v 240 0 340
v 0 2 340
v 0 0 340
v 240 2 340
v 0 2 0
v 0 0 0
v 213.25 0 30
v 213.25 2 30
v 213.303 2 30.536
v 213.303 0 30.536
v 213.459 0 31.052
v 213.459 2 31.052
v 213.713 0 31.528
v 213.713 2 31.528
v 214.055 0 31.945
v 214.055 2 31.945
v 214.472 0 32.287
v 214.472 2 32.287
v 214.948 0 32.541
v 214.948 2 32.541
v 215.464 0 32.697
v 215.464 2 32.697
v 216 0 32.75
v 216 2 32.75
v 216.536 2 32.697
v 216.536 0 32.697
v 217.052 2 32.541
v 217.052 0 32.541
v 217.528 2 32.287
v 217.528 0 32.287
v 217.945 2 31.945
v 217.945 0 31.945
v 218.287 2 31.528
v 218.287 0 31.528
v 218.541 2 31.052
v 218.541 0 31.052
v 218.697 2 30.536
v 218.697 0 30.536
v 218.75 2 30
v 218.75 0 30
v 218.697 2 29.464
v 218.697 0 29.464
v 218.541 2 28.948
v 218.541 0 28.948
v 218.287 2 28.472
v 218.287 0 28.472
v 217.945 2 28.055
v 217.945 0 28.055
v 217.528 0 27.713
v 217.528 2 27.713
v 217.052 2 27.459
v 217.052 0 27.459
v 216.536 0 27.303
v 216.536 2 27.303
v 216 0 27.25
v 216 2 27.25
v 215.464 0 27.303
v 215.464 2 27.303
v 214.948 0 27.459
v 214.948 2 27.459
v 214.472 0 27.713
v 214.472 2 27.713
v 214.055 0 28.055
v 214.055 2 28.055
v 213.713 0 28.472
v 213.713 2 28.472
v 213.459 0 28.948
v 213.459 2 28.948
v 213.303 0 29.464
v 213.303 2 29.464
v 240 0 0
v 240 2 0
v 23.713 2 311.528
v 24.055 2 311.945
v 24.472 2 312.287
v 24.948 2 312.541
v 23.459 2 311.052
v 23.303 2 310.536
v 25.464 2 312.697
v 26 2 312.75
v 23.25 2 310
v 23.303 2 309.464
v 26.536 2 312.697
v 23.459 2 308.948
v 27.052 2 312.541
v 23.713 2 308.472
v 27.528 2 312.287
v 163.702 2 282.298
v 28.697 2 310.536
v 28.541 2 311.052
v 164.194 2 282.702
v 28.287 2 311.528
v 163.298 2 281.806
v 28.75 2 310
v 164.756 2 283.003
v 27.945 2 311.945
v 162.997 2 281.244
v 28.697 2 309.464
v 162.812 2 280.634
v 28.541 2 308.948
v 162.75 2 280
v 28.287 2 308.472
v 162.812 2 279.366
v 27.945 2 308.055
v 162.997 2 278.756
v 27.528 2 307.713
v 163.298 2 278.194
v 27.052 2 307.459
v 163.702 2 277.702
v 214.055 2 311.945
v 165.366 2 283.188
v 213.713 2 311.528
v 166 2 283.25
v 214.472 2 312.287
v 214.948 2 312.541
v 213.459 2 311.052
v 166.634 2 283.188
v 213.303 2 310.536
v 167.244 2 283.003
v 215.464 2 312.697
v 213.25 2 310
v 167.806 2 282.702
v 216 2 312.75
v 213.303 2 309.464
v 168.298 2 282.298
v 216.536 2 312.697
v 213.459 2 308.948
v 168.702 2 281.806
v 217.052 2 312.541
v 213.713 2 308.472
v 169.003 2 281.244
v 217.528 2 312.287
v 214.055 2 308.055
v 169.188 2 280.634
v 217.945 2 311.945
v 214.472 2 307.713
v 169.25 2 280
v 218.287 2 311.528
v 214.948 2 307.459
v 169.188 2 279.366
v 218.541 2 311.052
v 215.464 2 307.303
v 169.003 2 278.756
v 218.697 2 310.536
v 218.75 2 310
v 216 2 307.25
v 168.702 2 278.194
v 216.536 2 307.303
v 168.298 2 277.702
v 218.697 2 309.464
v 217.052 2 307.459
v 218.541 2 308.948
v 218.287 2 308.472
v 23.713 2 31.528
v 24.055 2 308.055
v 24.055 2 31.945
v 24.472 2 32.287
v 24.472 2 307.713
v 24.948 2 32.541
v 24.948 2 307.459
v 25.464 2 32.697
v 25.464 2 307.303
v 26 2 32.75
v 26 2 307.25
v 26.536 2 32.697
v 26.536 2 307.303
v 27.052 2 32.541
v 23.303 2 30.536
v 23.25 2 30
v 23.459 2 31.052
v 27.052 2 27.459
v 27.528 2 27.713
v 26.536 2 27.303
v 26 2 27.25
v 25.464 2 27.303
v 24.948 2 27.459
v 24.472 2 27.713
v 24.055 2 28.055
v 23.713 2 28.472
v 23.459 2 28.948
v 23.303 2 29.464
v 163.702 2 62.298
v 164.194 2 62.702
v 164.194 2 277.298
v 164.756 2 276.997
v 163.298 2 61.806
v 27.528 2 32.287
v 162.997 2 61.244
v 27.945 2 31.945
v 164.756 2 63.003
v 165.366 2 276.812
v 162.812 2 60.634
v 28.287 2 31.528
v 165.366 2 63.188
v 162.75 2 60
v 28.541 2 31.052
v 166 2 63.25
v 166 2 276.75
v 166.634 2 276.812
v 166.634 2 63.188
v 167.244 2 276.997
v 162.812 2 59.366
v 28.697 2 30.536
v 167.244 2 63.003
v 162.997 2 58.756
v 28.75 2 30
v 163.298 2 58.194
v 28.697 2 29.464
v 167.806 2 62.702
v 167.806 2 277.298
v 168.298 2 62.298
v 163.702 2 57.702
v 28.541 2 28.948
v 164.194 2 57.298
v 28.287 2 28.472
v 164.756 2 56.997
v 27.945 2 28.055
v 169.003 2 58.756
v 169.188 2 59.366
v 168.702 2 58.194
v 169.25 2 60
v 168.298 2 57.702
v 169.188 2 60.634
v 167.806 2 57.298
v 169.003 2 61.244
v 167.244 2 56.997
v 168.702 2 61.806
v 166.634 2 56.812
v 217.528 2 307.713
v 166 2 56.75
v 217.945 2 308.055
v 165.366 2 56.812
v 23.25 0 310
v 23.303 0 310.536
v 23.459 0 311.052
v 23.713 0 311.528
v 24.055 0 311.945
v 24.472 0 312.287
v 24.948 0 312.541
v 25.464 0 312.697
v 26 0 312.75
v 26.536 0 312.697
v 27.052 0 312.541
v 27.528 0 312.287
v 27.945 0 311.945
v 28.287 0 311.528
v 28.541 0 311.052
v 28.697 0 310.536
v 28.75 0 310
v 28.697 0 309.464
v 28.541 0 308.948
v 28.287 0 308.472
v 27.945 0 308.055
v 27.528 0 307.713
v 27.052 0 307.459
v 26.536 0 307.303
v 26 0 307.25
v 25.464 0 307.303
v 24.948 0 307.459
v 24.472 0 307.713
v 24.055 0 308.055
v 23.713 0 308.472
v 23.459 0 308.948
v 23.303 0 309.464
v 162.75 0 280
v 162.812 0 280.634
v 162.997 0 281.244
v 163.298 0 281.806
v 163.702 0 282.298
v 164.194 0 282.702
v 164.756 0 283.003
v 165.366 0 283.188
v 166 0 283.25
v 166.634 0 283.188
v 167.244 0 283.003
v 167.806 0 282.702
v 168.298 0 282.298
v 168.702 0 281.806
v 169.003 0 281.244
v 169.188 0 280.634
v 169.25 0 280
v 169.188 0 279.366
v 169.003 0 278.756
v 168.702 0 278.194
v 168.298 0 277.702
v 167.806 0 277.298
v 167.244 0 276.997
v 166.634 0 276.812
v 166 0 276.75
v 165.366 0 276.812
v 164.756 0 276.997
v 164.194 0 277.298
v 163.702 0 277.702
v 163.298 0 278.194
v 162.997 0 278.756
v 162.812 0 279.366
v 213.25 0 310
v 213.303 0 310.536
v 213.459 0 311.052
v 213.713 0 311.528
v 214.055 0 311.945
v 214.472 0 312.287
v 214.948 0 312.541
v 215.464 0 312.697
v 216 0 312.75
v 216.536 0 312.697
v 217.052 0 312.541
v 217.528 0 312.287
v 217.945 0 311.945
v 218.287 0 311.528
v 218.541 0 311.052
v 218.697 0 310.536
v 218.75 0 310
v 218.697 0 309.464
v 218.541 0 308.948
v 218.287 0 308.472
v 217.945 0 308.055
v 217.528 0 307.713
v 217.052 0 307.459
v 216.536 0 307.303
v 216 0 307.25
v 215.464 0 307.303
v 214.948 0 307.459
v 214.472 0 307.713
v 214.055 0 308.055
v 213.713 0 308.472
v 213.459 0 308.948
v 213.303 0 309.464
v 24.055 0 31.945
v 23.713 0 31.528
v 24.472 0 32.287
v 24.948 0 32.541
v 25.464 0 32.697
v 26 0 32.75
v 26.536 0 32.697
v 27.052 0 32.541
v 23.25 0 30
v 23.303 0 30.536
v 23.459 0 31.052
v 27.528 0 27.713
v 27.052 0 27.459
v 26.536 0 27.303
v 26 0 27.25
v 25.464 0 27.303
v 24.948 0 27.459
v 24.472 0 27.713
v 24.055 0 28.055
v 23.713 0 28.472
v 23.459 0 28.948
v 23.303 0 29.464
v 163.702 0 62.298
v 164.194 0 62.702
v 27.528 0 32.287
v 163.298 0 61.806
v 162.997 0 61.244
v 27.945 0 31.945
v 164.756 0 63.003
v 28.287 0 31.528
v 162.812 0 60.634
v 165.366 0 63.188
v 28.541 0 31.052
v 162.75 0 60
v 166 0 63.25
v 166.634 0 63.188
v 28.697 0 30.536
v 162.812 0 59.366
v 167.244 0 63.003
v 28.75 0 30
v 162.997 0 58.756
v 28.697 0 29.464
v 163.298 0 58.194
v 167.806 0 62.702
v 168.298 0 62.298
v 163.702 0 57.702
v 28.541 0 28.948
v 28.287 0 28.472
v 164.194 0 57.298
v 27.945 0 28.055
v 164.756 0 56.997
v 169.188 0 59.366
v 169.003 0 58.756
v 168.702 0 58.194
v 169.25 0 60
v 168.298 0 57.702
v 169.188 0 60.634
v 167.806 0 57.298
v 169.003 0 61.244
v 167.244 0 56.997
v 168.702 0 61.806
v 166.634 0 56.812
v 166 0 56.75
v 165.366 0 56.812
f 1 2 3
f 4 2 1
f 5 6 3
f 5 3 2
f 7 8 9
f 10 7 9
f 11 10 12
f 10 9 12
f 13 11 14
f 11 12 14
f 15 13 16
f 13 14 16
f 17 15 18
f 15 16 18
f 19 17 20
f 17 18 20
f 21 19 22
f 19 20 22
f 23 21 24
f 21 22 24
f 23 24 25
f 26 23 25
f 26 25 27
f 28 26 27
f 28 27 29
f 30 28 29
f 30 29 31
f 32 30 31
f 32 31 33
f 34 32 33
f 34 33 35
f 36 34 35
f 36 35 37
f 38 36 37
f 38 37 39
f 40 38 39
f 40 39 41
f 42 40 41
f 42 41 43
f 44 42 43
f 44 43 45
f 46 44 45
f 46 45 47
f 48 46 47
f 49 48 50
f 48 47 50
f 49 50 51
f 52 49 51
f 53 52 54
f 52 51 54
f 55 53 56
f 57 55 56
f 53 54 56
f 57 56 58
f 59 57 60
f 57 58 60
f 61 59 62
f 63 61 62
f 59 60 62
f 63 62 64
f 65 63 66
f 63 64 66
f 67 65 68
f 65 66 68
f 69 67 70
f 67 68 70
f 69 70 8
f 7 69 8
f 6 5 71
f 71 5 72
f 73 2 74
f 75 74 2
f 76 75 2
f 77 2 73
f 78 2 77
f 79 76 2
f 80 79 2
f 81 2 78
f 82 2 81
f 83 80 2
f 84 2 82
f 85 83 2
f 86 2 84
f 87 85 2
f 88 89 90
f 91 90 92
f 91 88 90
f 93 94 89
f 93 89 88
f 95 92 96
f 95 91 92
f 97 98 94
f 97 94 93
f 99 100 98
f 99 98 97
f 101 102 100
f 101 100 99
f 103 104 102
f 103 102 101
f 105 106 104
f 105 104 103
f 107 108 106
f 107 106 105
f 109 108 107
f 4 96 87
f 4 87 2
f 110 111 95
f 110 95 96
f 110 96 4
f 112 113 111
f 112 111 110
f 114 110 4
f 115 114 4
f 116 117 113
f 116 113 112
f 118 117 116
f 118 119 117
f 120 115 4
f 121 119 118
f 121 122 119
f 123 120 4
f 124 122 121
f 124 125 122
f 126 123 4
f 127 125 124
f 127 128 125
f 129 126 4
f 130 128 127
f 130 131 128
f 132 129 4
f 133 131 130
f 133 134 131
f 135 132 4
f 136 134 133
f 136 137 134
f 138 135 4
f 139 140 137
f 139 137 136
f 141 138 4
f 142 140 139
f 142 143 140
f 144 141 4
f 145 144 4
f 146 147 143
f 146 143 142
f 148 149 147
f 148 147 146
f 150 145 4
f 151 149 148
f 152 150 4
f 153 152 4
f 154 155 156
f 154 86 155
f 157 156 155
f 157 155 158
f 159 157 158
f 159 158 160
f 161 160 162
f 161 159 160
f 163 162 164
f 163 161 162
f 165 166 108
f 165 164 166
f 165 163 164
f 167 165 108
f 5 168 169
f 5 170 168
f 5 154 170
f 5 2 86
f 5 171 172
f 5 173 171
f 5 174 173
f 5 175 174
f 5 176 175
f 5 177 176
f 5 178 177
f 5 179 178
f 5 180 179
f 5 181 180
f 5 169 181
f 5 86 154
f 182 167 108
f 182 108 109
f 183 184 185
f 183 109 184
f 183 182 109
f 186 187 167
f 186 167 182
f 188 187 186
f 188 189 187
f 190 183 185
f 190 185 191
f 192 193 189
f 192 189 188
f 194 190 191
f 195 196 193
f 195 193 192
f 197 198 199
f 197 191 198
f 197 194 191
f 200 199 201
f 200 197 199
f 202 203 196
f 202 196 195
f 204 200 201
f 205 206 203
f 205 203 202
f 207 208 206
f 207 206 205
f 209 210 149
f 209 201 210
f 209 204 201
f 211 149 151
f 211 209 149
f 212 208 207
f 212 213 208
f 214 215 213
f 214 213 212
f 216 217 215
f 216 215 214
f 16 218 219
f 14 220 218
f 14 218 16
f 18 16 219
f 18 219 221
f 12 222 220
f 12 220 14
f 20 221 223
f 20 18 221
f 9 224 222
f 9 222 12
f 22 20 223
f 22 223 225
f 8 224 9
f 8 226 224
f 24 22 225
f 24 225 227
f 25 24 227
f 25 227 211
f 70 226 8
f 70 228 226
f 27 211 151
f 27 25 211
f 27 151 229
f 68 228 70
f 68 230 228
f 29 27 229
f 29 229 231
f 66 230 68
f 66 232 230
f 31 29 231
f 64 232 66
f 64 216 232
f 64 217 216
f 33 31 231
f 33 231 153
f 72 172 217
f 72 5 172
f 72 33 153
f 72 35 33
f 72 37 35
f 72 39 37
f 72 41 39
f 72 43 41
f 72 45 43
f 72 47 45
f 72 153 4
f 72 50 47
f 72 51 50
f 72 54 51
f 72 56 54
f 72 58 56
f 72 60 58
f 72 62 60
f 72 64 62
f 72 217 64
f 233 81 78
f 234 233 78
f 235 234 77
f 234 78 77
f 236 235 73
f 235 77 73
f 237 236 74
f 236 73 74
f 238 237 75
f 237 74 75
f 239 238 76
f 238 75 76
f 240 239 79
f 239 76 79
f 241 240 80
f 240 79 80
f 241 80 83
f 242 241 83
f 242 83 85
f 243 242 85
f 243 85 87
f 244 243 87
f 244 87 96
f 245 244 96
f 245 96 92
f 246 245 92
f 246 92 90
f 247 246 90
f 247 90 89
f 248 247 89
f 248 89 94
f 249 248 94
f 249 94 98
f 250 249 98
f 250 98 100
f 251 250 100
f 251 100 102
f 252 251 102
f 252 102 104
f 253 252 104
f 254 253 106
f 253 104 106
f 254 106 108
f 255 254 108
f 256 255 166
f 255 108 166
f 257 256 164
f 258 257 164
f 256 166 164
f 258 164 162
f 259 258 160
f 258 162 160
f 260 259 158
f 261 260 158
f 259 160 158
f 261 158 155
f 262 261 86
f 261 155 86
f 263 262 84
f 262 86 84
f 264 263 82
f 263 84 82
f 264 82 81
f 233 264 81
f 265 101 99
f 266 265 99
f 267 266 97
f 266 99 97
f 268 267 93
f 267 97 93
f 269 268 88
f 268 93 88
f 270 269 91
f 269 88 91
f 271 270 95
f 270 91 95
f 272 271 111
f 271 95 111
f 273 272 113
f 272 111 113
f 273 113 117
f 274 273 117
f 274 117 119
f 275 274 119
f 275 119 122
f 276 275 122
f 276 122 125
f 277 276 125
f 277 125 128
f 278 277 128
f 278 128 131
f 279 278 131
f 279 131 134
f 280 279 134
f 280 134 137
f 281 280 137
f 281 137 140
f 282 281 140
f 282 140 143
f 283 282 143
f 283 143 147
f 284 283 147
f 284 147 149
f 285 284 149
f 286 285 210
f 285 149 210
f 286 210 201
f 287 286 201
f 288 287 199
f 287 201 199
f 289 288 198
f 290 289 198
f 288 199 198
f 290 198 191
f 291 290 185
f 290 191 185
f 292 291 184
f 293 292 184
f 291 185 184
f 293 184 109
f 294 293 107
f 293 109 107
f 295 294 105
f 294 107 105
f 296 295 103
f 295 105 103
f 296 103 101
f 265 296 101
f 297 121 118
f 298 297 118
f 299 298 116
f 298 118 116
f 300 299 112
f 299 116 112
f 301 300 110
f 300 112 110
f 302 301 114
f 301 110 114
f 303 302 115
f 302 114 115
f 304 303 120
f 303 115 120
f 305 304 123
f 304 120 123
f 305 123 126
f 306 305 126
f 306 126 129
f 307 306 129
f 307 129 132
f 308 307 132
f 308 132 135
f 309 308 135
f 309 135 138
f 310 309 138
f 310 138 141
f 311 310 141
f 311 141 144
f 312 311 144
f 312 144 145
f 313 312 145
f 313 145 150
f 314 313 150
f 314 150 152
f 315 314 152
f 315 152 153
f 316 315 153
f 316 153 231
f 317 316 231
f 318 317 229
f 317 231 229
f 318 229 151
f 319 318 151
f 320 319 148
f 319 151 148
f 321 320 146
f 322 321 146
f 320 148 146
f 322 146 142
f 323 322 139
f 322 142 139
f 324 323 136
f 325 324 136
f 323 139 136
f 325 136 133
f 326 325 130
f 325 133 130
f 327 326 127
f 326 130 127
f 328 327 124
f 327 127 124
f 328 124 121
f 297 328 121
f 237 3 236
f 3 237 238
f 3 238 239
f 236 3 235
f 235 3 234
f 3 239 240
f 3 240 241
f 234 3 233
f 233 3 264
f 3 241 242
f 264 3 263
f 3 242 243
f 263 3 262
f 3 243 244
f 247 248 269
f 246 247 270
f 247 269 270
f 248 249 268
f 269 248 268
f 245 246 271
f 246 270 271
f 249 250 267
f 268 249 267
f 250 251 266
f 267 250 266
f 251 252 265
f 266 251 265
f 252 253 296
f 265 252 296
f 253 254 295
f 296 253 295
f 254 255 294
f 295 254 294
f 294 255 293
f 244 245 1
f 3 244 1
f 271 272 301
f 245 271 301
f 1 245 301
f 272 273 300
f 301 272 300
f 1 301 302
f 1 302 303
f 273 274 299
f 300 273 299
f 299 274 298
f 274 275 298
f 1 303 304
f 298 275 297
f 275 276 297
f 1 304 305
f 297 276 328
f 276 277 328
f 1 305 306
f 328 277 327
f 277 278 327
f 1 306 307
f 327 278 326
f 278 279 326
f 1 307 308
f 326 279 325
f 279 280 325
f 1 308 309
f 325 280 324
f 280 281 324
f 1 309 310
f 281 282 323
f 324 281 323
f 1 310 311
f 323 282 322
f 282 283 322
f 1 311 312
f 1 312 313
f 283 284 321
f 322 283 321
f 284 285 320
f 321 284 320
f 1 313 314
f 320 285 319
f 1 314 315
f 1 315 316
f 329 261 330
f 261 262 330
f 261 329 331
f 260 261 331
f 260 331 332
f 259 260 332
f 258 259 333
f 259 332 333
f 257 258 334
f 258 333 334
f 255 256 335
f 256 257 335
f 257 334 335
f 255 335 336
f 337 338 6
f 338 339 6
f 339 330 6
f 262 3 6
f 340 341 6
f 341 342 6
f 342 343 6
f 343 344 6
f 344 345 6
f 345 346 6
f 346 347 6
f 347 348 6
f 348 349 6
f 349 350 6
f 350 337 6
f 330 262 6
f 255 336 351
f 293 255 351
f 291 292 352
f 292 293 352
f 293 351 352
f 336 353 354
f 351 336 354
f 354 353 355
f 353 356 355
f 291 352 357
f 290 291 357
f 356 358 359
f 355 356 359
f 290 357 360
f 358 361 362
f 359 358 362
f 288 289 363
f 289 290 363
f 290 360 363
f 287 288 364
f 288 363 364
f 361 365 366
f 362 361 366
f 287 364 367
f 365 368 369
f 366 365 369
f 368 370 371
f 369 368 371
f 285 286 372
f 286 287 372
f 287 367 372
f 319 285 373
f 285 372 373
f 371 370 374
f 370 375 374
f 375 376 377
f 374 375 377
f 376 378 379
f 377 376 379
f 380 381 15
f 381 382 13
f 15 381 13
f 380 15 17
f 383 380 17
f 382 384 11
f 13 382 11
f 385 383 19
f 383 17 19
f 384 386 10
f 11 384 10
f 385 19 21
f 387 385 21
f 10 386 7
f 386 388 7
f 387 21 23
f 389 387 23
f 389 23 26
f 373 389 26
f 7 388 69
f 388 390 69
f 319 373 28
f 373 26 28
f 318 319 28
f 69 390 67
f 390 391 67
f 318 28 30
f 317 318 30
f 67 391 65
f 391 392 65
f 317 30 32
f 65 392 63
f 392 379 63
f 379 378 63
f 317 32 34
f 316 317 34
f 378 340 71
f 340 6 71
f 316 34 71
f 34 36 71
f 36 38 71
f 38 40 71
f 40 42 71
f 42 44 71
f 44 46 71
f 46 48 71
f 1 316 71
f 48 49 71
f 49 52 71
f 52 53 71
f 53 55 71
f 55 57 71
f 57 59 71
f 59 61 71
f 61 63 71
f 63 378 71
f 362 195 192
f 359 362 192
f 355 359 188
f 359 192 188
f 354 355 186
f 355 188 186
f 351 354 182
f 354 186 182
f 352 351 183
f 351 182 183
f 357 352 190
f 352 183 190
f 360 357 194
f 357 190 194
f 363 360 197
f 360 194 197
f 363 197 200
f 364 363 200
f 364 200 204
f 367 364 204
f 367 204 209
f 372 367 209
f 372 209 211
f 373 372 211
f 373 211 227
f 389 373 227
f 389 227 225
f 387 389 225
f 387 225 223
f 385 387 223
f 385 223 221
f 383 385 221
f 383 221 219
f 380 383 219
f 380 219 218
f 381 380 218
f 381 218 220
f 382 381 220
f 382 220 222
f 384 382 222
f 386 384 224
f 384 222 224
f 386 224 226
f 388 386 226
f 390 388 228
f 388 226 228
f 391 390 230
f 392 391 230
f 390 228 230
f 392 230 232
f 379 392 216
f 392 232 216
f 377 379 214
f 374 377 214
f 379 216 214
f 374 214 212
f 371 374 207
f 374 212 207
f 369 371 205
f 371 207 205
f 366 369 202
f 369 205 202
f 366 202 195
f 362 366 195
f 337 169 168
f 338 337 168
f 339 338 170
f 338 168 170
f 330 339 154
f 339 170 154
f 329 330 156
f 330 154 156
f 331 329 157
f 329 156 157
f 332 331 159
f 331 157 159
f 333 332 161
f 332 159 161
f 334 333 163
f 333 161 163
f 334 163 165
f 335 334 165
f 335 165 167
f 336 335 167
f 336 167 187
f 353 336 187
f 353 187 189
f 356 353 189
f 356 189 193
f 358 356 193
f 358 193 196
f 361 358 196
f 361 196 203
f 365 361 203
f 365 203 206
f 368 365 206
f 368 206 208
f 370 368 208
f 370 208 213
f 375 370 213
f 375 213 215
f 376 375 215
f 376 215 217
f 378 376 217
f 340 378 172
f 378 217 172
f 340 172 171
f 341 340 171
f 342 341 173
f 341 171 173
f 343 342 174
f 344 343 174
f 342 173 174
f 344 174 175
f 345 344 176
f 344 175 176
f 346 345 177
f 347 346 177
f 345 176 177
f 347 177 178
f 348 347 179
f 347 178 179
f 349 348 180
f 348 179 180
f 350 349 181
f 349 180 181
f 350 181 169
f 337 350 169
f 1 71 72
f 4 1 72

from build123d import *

# Parameters (mm, degrees)
ESQUISSE1_W                     = 240
ESQUISSE1_H                     = 2
BASE_EXTRUSION_DEPTH            = 340
ESQUISSE2_R                     = 2.75
ENL_V_MAT_EXTRU_1_DEPTH         = 417.177846599
R_P_TITION_LIN_AIRE1_COUNT      = 2
R_P_TITION_LIN_AIRE1_PITCH      = 190
R_P_TITION_LIN_AIRE1_COUNT_DIR2 = 2
R_P_TITION_LIN_AIRE1_PITCH_DIR2 = 280
ESQUISSE3_R                     = 3.25
ENL_V_MAT_EXTRU_2_DEPTH         = 417.177846599


with BuildPart() as part:
    # Esquisse1 → Base-Extrusion (new body)
    with BuildSketch(Plane.XY):
        with Locations((120, 1)):
            Rectangle(ESQUISSE1_W, ESQUISSE1_H)
    extrude(amount=BASE_EXTRUSION_DEPTH)

    # Esquisse2 → Enlèv. mat.-Extru.1 (cut, through all)
    with BuildSketch(Plane(origin=(0, 2, 0), x_dir=(-1, 0, 0), z_dir=(0, 1, 0))):
        with Locations((-216, 30)):
            Circle(ESQUISSE2_R)
    enl_v_mat_extru_1 = extrude(amount=-ENL_V_MAT_EXTRU_1_DEPTH, mode=Mode.SUBTRACT)

    # Répétition linéaire1: Enl_v. mat.-Extru.1 2 × 2
    with Locations(*[(-i * R_P_TITION_LIN_AIRE1_PITCH, 0, j * R_P_TITION_LIN_AIRE1_PITCH_DIR2) for i in range(R_P_TITION_LIN_AIRE1_COUNT) for j in range(R_P_TITION_LIN_AIRE1_COUNT_DIR2) if (i, j) != (0, 0)]):
        add(enl_v_mat_extru_1, mode=Mode.SUBTRACT)

    # Esquisse3 → Enlèv. mat.-Extru.2 (cut, through all)
    with BuildSketch(Plane(origin=(0, 2, 0), x_dir=(-1, 0, 0), z_dir=(0, 1, 0))):
        with Locations((-166, 280)):
            Circle(ESQUISSE3_R)
        with Locations((-166, 60)):
            Circle(ESQUISSE3_R)
    extrude(amount=-ENL_V_MAT_EXTRU_2_DEPTH, mode=Mode.SUBTRACT)


solid = part.part
